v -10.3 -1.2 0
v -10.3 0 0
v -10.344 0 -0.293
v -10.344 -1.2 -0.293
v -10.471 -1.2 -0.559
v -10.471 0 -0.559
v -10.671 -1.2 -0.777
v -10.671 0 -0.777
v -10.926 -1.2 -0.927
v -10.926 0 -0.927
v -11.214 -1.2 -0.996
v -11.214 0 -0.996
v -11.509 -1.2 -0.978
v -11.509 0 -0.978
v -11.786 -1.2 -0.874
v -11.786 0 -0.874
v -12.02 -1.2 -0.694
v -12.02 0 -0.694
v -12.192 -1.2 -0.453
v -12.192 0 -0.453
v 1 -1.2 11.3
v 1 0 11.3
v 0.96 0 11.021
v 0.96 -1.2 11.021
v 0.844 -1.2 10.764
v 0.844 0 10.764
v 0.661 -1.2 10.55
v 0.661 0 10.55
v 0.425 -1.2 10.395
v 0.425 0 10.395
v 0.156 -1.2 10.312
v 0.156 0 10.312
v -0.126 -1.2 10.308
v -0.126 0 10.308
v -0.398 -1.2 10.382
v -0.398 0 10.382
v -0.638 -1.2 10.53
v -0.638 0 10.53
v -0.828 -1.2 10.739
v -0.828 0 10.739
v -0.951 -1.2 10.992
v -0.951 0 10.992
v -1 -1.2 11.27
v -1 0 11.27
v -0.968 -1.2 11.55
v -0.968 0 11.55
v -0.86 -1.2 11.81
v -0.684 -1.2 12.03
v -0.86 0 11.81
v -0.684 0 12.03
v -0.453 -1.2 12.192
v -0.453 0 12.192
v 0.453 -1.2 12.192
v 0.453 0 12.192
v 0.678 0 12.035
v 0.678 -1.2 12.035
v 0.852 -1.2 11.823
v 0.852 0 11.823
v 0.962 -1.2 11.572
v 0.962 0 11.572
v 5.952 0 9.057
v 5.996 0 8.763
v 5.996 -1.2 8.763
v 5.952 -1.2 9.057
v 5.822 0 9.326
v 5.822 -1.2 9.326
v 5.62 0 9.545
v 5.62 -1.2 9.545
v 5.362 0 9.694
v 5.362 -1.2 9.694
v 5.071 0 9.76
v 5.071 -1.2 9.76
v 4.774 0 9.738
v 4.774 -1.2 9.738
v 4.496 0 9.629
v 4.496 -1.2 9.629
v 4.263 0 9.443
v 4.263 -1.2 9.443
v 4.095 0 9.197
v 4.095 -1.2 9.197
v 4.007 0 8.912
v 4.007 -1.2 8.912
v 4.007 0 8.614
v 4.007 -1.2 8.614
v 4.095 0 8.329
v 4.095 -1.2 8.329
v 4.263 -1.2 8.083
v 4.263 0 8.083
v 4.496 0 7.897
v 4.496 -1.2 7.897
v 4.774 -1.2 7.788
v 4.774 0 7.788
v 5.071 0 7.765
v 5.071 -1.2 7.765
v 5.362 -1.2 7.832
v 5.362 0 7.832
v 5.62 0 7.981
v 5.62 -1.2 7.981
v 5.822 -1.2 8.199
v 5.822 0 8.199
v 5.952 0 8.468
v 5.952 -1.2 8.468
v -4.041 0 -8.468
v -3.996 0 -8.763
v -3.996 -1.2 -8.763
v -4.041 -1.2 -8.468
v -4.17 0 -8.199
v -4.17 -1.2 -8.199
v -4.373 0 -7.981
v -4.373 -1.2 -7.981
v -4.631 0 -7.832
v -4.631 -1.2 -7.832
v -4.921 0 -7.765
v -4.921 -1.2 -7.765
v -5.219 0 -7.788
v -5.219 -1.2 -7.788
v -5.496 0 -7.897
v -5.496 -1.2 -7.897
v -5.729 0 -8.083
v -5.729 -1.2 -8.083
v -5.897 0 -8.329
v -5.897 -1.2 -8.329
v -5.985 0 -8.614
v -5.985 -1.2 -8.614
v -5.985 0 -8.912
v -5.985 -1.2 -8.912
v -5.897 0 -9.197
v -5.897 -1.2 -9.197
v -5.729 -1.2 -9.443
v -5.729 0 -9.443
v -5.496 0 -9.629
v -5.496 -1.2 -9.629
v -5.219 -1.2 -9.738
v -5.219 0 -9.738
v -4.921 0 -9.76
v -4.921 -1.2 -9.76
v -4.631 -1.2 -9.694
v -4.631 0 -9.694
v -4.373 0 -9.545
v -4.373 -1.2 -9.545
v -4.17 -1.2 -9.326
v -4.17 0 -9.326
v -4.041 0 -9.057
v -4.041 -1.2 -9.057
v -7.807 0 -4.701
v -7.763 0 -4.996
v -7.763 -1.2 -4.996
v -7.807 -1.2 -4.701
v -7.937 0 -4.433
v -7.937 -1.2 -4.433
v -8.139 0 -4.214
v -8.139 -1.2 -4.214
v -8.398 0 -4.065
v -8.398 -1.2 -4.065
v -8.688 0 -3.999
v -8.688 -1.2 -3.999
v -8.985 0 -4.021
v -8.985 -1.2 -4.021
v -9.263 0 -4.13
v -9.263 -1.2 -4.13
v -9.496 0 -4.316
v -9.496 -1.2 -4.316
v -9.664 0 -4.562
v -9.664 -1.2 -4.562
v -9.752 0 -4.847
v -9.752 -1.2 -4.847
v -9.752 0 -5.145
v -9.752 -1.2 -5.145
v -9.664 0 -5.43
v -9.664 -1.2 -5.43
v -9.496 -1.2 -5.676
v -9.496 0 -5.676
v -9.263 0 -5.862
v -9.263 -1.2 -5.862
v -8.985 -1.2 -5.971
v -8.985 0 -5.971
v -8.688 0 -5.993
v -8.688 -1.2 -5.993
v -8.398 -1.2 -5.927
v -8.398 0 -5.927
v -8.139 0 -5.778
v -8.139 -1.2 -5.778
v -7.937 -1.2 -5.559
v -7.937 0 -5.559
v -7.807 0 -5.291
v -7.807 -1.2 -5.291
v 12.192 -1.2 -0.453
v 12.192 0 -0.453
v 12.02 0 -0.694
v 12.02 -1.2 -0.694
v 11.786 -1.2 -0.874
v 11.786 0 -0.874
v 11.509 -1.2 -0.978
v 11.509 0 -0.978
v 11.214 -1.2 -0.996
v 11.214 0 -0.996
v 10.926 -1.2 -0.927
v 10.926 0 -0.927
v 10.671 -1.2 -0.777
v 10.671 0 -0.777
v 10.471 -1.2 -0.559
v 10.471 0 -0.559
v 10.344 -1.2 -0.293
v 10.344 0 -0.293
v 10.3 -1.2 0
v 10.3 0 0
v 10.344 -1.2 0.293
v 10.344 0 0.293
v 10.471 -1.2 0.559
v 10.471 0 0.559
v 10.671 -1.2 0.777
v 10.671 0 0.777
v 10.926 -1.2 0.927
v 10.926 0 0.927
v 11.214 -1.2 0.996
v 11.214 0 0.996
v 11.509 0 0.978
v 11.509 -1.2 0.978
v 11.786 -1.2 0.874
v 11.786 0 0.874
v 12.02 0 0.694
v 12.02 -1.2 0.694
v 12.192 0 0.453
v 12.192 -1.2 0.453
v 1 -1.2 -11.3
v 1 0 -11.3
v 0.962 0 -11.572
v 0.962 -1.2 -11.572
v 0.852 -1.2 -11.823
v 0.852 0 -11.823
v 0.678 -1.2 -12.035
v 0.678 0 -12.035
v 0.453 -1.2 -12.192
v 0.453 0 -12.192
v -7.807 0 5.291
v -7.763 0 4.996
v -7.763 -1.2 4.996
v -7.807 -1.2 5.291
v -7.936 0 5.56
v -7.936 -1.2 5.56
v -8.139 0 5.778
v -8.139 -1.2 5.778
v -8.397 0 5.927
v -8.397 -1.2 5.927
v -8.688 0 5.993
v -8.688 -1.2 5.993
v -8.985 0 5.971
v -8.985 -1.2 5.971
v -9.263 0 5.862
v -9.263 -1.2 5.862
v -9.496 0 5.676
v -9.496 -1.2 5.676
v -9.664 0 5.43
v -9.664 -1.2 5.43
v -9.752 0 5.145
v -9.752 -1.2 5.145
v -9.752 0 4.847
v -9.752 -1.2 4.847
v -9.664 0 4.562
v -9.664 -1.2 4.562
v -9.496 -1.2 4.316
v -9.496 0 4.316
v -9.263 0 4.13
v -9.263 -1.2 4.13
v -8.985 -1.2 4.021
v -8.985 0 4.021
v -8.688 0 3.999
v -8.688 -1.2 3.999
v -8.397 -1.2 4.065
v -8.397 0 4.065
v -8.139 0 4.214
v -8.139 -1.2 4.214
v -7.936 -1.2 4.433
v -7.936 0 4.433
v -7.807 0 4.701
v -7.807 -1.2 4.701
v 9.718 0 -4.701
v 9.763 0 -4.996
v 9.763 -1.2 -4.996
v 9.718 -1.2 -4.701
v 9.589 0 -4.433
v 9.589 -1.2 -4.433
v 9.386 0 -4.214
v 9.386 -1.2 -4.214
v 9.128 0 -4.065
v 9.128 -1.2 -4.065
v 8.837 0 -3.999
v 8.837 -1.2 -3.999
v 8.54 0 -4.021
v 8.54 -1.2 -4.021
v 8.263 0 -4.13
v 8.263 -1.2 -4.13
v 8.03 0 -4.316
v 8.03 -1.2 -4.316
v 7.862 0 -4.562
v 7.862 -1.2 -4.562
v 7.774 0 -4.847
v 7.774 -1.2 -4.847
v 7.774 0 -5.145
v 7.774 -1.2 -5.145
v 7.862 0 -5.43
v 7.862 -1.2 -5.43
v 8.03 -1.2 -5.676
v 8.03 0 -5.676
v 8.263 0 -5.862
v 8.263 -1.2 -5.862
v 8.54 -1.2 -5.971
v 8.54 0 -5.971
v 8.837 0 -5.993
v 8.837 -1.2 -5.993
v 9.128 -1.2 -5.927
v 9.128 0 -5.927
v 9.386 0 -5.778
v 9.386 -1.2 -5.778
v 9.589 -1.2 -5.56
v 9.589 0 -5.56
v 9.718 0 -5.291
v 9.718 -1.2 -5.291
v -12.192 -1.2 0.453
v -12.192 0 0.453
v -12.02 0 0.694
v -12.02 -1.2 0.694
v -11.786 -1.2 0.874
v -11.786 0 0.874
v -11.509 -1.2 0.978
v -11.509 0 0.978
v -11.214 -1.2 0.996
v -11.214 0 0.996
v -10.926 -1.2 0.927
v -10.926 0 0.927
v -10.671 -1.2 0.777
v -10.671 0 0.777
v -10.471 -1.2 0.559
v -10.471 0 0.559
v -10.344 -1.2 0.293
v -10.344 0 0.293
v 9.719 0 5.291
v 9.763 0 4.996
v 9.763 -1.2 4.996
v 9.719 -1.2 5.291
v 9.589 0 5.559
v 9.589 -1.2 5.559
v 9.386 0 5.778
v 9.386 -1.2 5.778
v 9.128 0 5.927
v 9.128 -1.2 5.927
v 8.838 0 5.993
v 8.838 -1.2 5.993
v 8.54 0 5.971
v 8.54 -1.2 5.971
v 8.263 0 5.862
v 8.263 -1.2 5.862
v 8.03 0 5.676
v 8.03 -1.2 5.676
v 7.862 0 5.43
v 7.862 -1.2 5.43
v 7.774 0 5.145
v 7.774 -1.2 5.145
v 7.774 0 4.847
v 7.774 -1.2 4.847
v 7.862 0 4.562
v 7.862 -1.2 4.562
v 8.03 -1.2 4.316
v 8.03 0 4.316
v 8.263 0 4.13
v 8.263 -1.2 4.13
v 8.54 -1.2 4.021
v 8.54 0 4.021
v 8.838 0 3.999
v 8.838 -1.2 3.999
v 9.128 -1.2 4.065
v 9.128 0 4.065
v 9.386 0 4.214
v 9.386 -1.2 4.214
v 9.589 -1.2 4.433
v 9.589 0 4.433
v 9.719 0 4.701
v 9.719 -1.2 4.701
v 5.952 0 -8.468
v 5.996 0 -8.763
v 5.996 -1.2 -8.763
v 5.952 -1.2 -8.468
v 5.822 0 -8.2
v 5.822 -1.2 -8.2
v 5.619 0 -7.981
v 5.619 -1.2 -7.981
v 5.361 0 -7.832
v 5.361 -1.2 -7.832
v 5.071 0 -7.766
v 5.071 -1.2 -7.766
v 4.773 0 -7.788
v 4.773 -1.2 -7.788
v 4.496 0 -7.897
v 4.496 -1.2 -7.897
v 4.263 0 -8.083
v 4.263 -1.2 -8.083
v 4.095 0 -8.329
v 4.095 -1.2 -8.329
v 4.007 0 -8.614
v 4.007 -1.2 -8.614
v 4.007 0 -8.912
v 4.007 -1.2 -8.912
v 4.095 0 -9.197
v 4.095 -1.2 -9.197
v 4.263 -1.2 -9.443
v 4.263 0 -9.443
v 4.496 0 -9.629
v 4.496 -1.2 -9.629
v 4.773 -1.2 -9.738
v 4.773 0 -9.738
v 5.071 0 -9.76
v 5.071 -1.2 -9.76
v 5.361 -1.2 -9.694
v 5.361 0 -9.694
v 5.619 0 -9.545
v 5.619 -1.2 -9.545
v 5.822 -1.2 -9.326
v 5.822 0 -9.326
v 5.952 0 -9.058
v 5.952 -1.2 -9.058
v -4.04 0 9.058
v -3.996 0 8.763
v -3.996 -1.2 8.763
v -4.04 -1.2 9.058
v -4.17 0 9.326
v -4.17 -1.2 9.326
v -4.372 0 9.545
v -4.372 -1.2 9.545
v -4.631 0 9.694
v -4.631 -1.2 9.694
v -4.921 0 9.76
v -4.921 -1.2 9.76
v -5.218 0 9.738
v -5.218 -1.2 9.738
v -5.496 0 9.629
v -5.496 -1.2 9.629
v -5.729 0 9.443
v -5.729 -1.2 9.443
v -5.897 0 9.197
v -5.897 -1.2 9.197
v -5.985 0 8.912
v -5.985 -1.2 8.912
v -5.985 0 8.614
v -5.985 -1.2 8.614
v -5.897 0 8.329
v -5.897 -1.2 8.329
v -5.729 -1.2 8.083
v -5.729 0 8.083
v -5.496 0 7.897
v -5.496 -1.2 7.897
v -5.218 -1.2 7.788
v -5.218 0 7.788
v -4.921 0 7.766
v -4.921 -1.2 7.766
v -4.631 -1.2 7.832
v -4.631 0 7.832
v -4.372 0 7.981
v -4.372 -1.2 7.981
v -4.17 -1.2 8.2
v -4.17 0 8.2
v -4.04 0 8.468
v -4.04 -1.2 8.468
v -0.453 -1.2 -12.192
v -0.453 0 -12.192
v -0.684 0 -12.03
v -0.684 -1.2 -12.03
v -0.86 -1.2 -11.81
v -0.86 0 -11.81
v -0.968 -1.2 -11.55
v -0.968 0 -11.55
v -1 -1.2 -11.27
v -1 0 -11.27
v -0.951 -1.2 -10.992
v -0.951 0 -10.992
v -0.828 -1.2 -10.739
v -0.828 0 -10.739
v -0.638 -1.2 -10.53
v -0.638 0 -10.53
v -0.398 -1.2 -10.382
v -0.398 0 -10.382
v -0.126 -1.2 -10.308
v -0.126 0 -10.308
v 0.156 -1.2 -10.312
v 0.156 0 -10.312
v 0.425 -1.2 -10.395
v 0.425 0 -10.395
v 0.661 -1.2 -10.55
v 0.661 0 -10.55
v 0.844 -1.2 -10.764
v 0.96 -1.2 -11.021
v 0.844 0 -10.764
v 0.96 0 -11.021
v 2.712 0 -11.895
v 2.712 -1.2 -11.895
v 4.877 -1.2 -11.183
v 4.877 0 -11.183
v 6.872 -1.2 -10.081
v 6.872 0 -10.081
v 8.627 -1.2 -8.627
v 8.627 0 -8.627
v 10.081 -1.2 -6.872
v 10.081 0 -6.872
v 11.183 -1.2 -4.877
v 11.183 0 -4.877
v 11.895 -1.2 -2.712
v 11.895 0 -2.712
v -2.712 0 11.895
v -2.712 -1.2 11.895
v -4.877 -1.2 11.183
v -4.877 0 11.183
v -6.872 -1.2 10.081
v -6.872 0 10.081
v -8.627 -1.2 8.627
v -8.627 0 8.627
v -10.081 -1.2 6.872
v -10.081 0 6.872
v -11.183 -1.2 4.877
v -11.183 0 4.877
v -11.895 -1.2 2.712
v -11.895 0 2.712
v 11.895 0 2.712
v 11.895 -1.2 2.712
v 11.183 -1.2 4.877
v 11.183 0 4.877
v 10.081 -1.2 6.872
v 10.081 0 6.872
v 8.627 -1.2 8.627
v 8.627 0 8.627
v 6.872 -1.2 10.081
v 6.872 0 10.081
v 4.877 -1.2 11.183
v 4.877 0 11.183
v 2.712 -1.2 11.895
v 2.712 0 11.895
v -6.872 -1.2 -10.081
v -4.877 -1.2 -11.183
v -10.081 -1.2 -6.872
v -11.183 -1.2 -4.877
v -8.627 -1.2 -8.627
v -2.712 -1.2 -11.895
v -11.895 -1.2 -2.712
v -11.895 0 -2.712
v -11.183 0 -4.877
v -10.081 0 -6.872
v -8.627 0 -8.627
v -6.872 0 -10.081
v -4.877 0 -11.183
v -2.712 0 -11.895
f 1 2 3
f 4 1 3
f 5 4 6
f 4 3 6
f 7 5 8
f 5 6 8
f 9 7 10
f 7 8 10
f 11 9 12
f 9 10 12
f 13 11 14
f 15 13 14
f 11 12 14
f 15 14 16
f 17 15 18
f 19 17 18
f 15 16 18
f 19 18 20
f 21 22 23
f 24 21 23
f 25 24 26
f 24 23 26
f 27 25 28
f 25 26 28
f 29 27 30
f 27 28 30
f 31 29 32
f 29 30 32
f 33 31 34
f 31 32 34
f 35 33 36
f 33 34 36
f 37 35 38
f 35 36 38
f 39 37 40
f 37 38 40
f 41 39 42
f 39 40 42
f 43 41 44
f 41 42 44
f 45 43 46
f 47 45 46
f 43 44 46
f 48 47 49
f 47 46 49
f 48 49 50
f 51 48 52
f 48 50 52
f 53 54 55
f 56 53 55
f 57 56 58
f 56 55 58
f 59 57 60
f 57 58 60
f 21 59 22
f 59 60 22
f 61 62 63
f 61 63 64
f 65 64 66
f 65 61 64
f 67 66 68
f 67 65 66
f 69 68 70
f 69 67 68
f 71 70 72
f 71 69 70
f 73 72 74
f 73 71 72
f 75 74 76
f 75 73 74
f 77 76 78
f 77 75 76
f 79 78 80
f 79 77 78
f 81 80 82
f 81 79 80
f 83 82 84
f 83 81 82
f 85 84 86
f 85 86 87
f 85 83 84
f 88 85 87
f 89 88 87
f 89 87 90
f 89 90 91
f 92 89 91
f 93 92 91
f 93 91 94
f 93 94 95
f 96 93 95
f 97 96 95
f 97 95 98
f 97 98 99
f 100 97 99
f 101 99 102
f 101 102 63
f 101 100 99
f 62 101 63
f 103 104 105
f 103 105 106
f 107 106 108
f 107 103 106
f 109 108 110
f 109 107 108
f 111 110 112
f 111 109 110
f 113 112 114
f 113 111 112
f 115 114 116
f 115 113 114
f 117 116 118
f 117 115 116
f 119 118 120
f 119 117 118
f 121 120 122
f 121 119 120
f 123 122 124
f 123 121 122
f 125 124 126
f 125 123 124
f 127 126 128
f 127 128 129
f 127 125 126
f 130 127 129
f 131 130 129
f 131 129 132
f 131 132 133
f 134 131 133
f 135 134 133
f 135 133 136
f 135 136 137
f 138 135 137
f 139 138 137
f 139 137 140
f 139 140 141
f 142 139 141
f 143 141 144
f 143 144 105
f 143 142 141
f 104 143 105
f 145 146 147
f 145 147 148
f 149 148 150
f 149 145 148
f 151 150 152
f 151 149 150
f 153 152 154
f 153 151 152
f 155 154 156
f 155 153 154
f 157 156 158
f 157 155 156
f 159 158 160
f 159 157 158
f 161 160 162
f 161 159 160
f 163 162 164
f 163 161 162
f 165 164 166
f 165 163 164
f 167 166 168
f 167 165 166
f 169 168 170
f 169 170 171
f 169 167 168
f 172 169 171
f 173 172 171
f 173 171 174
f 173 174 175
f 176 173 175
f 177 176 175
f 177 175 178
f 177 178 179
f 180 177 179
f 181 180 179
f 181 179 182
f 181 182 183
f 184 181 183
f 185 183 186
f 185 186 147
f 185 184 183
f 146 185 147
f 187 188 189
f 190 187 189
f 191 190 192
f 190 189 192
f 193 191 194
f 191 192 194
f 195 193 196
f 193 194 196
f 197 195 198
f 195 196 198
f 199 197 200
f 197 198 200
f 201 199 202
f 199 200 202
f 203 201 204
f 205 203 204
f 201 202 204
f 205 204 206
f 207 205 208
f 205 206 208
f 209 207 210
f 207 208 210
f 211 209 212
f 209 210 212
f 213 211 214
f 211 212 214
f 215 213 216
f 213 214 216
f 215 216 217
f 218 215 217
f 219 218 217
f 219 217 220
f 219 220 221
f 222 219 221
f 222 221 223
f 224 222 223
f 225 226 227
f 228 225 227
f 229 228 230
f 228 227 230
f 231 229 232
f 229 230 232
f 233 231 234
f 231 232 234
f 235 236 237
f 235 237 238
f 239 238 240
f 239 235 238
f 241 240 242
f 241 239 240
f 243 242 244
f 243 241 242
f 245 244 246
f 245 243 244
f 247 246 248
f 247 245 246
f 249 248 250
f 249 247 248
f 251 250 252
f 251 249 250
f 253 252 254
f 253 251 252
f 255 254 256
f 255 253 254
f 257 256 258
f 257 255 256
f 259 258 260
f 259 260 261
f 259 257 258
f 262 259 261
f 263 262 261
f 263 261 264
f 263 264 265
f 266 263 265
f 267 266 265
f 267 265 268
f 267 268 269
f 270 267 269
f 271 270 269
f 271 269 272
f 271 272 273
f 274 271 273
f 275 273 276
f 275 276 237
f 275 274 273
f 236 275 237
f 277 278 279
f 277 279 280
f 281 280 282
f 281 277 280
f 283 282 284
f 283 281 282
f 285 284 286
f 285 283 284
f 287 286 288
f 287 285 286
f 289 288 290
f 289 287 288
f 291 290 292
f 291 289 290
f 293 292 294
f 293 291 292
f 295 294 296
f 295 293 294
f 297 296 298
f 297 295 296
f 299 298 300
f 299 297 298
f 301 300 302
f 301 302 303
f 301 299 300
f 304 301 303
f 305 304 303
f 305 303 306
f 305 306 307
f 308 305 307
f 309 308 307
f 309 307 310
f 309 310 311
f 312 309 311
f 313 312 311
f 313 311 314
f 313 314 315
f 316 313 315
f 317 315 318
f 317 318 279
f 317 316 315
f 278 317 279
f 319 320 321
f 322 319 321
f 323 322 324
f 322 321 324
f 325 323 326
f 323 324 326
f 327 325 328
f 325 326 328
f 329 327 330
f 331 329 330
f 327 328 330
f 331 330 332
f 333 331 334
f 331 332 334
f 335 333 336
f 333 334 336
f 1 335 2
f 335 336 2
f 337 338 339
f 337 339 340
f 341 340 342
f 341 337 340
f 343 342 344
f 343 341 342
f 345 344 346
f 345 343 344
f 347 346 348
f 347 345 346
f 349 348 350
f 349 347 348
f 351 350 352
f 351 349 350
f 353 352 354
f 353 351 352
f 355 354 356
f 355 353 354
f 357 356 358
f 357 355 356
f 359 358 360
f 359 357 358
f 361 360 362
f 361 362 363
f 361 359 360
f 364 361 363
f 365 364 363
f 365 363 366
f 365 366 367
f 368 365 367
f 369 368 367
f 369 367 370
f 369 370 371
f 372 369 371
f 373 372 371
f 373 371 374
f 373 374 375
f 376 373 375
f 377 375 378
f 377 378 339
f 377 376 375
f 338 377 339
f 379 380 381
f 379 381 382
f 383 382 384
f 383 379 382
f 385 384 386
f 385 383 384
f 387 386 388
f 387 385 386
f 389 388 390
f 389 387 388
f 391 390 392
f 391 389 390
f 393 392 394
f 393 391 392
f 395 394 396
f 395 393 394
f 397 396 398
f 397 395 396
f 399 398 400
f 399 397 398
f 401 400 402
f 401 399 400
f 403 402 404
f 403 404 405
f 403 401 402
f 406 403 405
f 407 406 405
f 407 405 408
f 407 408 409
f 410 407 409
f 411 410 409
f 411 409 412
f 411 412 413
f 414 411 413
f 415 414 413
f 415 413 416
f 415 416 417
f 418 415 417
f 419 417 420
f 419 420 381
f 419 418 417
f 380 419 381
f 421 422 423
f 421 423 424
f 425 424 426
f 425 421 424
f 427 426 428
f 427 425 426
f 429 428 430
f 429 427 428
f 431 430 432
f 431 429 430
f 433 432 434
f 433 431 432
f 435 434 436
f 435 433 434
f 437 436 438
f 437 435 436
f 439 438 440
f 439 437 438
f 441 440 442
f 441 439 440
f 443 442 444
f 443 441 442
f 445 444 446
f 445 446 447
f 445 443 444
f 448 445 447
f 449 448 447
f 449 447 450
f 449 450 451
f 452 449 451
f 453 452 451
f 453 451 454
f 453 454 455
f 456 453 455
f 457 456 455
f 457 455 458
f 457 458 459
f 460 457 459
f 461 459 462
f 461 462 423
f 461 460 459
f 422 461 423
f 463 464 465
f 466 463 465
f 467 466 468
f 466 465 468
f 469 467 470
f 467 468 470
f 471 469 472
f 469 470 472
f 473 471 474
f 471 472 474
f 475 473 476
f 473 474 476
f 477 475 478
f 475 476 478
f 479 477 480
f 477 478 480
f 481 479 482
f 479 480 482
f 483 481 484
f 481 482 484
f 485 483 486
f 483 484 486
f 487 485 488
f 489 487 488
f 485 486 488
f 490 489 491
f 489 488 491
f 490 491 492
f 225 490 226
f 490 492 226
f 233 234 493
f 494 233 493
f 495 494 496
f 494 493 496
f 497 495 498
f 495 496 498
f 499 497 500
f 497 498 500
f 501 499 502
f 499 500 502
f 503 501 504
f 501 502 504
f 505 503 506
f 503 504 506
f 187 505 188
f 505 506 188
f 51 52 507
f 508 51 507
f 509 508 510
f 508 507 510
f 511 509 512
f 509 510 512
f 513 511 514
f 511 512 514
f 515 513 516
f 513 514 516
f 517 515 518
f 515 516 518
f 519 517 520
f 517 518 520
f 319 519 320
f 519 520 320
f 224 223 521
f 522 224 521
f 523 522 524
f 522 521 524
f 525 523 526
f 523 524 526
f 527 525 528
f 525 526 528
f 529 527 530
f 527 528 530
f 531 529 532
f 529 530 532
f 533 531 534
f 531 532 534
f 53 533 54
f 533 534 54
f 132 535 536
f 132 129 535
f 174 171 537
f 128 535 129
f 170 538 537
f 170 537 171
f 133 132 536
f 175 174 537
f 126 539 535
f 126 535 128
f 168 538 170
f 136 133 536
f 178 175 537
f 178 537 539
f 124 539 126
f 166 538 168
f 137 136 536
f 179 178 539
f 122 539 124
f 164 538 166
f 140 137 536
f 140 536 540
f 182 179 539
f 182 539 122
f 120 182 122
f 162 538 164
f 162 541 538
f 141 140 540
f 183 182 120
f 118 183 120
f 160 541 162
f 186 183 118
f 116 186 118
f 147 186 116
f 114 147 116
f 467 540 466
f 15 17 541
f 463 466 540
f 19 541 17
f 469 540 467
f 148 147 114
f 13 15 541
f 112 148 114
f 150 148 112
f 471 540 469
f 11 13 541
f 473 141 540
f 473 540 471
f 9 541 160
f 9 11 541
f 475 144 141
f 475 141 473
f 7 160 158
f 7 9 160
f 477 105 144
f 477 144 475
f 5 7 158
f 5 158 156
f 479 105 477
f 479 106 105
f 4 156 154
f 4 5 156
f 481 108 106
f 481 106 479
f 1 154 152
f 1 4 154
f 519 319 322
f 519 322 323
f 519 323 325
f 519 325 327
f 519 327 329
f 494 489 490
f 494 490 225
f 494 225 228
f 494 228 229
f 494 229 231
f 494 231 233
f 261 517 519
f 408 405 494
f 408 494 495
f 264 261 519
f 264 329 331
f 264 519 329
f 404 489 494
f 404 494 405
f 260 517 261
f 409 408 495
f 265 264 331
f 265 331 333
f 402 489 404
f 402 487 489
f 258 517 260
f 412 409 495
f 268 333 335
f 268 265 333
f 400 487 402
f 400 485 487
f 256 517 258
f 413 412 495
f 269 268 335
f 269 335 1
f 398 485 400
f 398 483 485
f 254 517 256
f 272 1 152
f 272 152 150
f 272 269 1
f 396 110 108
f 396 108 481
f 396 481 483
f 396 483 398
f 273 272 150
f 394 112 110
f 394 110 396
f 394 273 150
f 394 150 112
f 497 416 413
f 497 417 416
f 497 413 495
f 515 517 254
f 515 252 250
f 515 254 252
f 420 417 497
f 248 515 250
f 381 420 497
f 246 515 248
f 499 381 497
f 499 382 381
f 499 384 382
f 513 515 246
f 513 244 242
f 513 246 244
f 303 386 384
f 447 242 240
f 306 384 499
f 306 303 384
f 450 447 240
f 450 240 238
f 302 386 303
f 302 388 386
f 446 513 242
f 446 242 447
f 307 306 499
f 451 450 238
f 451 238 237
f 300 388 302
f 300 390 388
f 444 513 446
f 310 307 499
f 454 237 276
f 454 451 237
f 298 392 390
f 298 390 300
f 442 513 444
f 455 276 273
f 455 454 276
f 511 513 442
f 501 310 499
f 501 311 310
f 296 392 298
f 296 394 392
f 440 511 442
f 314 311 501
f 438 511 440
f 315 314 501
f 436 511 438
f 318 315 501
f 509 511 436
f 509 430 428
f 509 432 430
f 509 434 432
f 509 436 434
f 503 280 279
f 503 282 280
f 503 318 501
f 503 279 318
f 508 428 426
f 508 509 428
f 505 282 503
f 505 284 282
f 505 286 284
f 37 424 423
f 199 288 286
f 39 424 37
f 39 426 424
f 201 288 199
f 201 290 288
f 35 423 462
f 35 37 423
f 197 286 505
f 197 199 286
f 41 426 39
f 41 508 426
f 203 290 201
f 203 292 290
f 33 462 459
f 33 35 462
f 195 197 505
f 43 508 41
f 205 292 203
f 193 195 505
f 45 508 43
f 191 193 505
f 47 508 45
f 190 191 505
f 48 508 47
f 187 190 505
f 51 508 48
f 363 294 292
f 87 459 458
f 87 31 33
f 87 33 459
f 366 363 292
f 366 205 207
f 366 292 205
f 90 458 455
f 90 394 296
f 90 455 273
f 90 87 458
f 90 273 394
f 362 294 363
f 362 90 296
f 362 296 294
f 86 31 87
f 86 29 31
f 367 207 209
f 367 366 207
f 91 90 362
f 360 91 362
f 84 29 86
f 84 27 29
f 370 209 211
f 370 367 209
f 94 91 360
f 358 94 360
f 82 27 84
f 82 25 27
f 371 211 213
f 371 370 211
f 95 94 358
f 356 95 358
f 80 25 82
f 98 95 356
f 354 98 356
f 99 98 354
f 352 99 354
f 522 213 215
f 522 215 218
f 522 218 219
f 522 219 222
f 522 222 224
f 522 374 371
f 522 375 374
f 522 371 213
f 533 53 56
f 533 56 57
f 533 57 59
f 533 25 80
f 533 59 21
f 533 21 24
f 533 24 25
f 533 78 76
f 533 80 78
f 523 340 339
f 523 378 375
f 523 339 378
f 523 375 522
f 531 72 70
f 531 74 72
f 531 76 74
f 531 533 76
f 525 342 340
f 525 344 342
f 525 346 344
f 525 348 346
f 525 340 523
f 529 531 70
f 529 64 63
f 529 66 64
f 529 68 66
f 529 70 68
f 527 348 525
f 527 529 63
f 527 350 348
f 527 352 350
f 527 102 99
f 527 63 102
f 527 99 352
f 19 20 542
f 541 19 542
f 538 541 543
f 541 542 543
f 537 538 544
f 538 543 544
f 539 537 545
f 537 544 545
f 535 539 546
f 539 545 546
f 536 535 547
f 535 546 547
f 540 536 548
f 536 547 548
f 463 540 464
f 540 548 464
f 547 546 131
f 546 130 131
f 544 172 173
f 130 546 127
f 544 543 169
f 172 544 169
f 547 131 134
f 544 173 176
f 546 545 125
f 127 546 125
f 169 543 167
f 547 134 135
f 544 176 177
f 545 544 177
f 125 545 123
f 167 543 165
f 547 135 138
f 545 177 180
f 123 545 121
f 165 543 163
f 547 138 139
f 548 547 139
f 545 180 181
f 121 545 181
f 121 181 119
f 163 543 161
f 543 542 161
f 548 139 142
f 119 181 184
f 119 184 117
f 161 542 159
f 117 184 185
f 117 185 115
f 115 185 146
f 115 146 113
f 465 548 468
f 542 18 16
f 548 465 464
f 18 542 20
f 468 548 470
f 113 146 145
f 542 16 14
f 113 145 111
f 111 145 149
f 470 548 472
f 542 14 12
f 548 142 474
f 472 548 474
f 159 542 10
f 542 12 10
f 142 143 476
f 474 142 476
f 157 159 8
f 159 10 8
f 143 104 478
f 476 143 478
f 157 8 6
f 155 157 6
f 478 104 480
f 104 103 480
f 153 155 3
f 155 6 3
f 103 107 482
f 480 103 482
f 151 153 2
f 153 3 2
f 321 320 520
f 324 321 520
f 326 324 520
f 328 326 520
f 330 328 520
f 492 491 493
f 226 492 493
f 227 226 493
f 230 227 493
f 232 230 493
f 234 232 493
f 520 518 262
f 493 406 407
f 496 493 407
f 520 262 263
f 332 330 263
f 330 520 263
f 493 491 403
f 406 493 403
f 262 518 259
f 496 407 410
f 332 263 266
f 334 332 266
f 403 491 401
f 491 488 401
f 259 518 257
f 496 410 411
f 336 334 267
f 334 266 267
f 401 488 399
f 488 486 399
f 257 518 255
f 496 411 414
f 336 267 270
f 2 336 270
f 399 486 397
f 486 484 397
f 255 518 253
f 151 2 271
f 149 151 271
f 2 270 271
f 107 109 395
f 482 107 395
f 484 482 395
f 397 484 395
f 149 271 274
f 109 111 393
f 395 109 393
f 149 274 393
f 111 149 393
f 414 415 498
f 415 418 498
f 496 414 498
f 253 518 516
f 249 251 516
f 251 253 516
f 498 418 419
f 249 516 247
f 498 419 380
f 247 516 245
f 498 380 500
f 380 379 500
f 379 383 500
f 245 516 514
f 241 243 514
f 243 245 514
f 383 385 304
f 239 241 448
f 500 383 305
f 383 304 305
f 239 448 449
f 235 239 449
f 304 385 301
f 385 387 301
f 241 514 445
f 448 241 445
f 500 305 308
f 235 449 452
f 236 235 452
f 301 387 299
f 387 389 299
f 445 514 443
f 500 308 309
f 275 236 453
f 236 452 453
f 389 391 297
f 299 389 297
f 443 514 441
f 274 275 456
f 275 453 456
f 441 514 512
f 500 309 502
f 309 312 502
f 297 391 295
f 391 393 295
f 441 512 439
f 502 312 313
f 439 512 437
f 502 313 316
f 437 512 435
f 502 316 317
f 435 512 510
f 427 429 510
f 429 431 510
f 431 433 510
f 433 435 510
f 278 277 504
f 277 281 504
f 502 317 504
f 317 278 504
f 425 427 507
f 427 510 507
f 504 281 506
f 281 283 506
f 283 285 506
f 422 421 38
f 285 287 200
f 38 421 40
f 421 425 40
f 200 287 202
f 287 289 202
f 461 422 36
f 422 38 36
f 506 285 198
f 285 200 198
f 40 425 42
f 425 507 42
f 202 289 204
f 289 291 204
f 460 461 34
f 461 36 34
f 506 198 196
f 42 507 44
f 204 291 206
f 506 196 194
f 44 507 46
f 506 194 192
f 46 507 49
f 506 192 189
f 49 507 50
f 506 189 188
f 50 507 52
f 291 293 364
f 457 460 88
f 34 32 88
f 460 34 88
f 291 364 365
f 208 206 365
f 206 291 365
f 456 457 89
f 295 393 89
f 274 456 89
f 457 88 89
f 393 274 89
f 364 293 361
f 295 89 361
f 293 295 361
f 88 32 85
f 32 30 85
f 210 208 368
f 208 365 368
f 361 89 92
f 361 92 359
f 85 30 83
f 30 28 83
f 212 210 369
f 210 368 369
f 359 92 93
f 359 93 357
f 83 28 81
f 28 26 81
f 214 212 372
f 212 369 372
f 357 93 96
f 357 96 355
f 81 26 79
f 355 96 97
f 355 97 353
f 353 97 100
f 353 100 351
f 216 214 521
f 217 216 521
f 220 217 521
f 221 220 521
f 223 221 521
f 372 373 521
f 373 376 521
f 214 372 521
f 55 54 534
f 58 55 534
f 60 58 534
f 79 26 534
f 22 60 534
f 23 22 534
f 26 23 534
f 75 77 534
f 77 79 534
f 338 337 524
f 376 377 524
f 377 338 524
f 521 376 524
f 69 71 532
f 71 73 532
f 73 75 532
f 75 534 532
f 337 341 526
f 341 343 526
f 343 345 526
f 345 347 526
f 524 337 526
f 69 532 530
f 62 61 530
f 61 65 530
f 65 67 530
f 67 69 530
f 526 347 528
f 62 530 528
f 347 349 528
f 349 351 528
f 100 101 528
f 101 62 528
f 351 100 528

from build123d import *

# Parameters (mm, degrees)
F0_R     = 1
F1_DEPTH = 1.2


with BuildPart() as f1:
    # F0 (on Front) → F1 (new body)
    with BuildSketch(Plane.XZ):
        with BuildLine():
            ThreePointArc((12.1915929204, -0.4528377904), (10.3, 0), (12.1915929204, 0.4528377904))
            ThreePointArc((12.1915929204, 0.4528377904), (8.6267027305, 8.6267027305), (0.4528377904, 12.1915929204))
            ThreePointArc((0.4528377904, 12.1915929204), (0.852302115, 11.823049811), (1, 11.3))
            ThreePointArc((1, 11.3), (-0.523049811, 10.447697885), (-0.4528377904, 12.1915929204))
            ThreePointArc((-0.4528377904, 12.1915929204), (-8.6267027305, 8.6267027305), (-12.1915929204, 0.4528377904))
            ThreePointArc((-12.1915929204, 0.4528377904), (-11.0671834632, 0.9725206734), (-10.3, 0))
            ThreePointArc((-10.3, 0), (-11.0671834632, -0.9725206734), (-12.1915929204, -0.4528377904))
            ThreePointArc((-12.1915929204, -0.4528377904), (-8.6267027305, -8.6267027305), (-0.4528377904, -12.1915929204))
            ThreePointArc((-0.4528377904, -12.1915929204), (-0.523049811, -10.447697885), (1, -11.3))
            ThreePointArc((1, -11.3), (0.852302115, -11.823049811), (0.4528377904, -12.1915929204))
            ThreePointArc((0.4528377904, -12.1915929204), (8.6267027305, -8.6267027305), (12.1915929204, -0.4528377904))
        make_face()
        with Locations((-4.996208501, -8.7626928542)):
            Circle(F0_R, mode=Mode.SUBTRACT)
        with Locations((-8.7629663243, -4.9959350308)):
            Circle(F0_R, mode=Mode.SUBTRACT)
        with Locations((4.9959350308, -8.7629663243)):
            Circle(F0_R, mode=Mode.SUBTRACT)
        with Locations((8.7626928542, -4.996208501)):
            Circle(F0_R, mode=Mode.SUBTRACT)
        with Locations((-8.7626928542, 4.996208501)):
            Circle(F0_R, mode=Mode.SUBTRACT)
        with Locations((-4.9959350308, 8.7629663243)):
            Circle(F0_R, mode=Mode.SUBTRACT)
        with Locations((8.7629663243, 4.9959350308)):
            Circle(F0_R, mode=Mode.SUBTRACT)
        with Locations((4.996208501, 8.7626928542)):
            Circle(F0_R, mode=Mode.SUBTRACT)
    extrude(amount=F1_DEPTH)


solid = f1.part
